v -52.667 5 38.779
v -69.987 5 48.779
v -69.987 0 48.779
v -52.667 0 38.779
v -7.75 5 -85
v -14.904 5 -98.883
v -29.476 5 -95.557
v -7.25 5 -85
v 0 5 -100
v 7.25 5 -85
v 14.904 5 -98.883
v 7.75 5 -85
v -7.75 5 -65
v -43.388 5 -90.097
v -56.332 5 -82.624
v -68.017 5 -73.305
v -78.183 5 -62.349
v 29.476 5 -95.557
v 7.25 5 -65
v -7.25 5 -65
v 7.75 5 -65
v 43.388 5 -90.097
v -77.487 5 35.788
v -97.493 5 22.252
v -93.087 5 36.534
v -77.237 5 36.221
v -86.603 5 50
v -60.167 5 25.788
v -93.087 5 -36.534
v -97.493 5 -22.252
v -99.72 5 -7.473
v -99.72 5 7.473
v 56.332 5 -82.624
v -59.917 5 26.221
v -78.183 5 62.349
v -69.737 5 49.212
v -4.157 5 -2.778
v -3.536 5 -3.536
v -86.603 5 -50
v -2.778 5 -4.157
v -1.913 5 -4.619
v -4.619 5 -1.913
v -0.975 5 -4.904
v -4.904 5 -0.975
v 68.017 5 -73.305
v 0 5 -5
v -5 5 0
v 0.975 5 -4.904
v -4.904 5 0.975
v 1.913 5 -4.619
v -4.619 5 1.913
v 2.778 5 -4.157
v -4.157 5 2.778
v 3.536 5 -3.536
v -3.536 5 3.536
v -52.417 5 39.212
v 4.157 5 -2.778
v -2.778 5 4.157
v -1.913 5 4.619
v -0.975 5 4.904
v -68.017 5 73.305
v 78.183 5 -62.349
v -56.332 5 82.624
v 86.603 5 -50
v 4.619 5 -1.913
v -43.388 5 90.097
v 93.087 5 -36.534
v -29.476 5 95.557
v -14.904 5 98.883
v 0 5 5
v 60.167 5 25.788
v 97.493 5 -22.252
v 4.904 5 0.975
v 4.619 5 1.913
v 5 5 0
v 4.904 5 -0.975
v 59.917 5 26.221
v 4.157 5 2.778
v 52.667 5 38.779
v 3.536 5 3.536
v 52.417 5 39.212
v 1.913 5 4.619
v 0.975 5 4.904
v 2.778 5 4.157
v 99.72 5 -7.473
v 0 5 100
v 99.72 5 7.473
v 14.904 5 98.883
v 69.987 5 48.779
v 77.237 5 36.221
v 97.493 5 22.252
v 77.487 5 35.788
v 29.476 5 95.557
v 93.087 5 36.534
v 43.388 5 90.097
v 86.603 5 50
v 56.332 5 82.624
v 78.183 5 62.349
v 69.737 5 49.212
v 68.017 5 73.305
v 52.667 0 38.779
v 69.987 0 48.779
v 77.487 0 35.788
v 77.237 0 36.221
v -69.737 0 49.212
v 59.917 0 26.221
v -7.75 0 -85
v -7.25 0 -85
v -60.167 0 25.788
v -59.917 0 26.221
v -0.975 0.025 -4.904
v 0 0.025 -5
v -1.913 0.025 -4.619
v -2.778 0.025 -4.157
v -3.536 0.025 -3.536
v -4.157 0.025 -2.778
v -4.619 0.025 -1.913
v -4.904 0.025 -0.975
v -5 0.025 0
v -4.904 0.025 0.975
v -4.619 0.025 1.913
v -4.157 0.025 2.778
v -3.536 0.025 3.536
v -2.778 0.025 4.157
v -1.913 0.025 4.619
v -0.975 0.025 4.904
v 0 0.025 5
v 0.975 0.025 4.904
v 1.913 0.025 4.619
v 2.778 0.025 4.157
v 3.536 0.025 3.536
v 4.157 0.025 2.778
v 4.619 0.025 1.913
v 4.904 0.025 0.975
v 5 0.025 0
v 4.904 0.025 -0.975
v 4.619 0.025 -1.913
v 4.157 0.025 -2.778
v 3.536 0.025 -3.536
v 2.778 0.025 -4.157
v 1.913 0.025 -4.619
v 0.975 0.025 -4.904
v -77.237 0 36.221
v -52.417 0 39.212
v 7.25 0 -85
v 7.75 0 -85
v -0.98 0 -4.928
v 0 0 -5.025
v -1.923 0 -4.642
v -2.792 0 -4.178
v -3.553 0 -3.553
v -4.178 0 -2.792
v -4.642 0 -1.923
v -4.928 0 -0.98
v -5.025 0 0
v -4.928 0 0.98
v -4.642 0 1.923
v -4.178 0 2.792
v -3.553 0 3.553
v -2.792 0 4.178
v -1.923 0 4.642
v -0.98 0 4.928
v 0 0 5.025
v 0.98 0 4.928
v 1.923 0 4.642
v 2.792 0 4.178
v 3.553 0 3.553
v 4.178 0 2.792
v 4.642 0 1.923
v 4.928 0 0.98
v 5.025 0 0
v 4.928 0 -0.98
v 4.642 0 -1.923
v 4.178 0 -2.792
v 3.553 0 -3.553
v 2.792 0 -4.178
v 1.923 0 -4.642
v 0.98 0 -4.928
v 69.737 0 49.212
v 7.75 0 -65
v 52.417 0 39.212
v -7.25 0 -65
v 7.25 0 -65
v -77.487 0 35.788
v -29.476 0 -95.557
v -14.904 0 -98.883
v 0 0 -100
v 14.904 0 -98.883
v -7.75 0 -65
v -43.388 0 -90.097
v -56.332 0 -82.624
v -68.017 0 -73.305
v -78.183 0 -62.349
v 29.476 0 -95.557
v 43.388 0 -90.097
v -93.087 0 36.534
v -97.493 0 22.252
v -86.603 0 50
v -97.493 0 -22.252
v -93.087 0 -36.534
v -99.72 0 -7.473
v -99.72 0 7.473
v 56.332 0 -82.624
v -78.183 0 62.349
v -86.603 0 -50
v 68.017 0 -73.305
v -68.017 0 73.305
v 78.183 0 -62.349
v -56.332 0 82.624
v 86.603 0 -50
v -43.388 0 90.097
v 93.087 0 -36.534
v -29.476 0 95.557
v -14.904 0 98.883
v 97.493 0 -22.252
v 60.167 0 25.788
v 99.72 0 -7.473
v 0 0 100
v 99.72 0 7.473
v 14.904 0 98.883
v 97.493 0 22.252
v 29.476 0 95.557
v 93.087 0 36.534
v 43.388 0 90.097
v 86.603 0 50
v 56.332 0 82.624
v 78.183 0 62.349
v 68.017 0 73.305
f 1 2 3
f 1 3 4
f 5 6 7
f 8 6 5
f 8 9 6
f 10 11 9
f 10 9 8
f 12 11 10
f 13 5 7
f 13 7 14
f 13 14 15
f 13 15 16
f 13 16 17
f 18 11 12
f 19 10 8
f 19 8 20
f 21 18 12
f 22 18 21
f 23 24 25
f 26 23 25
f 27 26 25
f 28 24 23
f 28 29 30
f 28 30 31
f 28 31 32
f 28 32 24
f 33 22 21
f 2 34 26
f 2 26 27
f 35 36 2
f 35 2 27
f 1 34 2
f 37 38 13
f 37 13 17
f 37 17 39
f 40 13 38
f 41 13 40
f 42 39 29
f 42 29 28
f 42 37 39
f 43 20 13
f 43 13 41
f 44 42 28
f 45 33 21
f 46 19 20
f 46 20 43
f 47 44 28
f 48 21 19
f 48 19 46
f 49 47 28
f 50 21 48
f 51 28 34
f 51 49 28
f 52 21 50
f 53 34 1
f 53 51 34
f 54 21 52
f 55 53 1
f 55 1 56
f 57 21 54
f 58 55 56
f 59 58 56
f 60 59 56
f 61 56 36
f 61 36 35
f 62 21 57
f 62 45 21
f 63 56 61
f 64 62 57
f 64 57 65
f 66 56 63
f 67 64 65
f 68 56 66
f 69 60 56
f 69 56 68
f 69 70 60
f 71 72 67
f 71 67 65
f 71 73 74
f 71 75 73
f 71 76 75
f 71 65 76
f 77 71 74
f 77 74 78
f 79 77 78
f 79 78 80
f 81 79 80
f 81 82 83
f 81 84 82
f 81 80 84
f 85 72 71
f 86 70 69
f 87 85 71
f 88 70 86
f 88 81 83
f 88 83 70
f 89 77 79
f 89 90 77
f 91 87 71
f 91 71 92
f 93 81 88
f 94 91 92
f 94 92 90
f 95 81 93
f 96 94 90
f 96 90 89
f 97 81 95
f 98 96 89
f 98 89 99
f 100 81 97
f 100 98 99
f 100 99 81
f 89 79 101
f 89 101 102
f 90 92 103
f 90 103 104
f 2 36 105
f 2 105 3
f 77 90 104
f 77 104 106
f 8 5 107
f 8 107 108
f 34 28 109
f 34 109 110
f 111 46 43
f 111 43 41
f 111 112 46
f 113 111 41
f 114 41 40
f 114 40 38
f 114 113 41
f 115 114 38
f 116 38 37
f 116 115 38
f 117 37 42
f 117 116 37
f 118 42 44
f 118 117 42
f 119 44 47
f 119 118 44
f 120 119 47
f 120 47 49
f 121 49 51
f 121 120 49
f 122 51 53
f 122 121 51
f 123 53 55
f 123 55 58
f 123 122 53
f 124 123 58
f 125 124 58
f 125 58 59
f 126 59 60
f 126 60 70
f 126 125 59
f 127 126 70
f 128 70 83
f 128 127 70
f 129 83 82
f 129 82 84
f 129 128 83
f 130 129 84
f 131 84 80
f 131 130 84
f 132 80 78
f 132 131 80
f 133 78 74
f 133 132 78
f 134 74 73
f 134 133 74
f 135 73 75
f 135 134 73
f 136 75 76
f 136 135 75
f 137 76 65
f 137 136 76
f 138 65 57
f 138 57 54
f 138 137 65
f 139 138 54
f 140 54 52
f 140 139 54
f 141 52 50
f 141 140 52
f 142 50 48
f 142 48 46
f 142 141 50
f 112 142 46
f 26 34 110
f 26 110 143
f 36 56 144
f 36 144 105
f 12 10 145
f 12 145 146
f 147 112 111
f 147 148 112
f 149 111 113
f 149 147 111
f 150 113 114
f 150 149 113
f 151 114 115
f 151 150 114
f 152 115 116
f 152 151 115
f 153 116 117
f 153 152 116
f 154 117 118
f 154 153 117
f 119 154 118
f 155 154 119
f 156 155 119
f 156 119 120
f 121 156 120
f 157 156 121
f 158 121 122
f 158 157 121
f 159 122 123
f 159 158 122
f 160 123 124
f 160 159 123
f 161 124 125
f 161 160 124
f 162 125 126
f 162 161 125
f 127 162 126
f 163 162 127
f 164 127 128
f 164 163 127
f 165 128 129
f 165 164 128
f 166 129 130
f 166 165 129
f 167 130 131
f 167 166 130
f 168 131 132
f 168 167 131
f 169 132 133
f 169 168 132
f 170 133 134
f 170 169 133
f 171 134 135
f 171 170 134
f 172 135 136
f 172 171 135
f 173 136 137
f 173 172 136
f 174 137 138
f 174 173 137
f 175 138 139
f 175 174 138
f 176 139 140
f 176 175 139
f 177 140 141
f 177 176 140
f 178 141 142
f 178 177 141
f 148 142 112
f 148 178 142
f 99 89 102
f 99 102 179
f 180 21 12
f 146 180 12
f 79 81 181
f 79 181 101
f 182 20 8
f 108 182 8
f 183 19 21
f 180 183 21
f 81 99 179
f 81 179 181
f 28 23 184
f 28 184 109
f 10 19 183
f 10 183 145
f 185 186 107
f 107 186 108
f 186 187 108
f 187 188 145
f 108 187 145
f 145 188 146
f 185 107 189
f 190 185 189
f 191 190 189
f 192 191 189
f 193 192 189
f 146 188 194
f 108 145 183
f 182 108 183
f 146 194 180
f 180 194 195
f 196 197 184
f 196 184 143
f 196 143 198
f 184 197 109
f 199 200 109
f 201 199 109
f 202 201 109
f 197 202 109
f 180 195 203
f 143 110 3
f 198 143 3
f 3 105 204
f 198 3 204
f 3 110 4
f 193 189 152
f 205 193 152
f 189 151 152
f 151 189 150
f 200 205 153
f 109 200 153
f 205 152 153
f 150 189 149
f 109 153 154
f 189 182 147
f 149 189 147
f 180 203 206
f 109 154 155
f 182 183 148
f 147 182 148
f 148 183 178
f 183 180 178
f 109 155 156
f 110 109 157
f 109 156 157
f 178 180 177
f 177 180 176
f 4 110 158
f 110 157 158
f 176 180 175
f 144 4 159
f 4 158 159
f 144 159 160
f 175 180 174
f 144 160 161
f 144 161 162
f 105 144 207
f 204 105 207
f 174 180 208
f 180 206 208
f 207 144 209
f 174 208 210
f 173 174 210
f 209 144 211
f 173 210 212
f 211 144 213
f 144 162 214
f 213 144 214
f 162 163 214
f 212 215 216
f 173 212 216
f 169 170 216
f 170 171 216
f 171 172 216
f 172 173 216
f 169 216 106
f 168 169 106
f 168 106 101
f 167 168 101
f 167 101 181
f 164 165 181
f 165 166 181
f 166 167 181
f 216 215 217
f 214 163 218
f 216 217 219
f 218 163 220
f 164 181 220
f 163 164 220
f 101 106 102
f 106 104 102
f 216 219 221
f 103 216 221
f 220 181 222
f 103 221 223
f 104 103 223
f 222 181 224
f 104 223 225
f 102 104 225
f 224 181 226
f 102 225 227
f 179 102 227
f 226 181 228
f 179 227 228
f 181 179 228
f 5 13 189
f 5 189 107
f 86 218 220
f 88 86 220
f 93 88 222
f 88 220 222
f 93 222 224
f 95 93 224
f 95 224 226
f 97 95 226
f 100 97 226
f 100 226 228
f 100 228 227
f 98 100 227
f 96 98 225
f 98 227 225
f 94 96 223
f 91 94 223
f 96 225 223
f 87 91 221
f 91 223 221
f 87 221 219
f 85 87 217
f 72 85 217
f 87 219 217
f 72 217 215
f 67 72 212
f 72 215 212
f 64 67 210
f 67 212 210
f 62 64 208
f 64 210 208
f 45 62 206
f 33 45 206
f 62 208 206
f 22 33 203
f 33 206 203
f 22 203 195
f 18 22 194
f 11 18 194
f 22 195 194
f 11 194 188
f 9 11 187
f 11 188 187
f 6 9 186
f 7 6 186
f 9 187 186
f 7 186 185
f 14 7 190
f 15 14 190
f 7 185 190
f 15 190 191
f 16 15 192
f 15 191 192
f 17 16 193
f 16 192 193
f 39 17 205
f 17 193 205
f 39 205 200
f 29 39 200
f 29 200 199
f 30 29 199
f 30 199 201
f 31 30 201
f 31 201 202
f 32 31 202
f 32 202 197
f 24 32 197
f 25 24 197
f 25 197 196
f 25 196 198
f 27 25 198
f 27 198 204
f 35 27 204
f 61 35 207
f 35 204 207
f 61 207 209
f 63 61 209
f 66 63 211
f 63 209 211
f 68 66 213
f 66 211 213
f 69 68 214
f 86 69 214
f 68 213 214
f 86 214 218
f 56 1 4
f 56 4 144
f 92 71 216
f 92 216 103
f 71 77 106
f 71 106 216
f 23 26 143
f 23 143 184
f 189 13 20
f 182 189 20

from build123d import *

# Parameters (mm, degrees)
SKETCH2_R           = 100
BOSS_EXTRUDE1_DEPTH = 5
SKETCH3_W           = 0.5
SKETCH3_H           = 20
CUT_EXTRUDE1_DEPTH  = 142.509716981


with BuildPart() as part:
    # Sketch2 → Boss-Extrude1 (new body)
    with BuildSketch(Plane(origin=(0, 0, 0), x_dir=(1, 0, 0), z_dir=(0, 1, 0))):
        with Locations(Location((0, 0, 0), (0, 0, 270))):
            Circle(SKETCH2_R)
    extrude(amount=BOSS_EXTRUDE1_DEPTH)

    # Sketch3 → Cut-Extrude1 (cut, through all)
    with BuildSketch(Plane(origin=(0, 5, 0), x_dir=(1, 0, 0), z_dir=(0, 1, 0))):
        with Locations((-7.5, 75)):
            Rectangle(SKETCH3_W, SKETCH3_H)
        with Locations((7.5, 75)):
            Rectangle(SKETCH3_W, SKETCH3_H)
        Polygon((60.166651246, -25.788303121), (77.487159322, -35.788303121), (77.237159322, -36.221315823), (59.916651246, -26.221315823), align=None)
        Polygon((52.666651246, -38.778684177), (69.987159322, -48.778684177), (69.737159322, -49.211696879), (52.416651246, -39.211696879), align=None)
        Polygon((-52.416651246, -39.211696879), (-69.737159322, -49.211696879), (-69.987159322, -48.778684177), (-52.666651246, -38.778684177), align=None)
        Polygon((-59.916651246, -26.221315823), (-77.237159322, -36.221315823), (-77.487159322, -35.788303121), (-60.166651246, -25.788303121), align=None)
    extrude(amount=-CUT_EXTRUDE1_DEPTH, mode=Mode.SUBTRACT)

    # Sketch7 → Ø10.0mm Dowel Hole1 (revolve, cut)
    with BuildSketch(Plane(origin=(0, 0, 0), x_dir=(0, 0, -1), z_dir=(1, 0, 0))):
        Polygon((0, 0), (0, 5), (5, 5), (5, 0.025), (5.025, 0), align=None)
    revolve(axis=Axis((0, -6.35, 0), (0, 1, 0)), mode=Mode.SUBTRACT)


solid = part.part
